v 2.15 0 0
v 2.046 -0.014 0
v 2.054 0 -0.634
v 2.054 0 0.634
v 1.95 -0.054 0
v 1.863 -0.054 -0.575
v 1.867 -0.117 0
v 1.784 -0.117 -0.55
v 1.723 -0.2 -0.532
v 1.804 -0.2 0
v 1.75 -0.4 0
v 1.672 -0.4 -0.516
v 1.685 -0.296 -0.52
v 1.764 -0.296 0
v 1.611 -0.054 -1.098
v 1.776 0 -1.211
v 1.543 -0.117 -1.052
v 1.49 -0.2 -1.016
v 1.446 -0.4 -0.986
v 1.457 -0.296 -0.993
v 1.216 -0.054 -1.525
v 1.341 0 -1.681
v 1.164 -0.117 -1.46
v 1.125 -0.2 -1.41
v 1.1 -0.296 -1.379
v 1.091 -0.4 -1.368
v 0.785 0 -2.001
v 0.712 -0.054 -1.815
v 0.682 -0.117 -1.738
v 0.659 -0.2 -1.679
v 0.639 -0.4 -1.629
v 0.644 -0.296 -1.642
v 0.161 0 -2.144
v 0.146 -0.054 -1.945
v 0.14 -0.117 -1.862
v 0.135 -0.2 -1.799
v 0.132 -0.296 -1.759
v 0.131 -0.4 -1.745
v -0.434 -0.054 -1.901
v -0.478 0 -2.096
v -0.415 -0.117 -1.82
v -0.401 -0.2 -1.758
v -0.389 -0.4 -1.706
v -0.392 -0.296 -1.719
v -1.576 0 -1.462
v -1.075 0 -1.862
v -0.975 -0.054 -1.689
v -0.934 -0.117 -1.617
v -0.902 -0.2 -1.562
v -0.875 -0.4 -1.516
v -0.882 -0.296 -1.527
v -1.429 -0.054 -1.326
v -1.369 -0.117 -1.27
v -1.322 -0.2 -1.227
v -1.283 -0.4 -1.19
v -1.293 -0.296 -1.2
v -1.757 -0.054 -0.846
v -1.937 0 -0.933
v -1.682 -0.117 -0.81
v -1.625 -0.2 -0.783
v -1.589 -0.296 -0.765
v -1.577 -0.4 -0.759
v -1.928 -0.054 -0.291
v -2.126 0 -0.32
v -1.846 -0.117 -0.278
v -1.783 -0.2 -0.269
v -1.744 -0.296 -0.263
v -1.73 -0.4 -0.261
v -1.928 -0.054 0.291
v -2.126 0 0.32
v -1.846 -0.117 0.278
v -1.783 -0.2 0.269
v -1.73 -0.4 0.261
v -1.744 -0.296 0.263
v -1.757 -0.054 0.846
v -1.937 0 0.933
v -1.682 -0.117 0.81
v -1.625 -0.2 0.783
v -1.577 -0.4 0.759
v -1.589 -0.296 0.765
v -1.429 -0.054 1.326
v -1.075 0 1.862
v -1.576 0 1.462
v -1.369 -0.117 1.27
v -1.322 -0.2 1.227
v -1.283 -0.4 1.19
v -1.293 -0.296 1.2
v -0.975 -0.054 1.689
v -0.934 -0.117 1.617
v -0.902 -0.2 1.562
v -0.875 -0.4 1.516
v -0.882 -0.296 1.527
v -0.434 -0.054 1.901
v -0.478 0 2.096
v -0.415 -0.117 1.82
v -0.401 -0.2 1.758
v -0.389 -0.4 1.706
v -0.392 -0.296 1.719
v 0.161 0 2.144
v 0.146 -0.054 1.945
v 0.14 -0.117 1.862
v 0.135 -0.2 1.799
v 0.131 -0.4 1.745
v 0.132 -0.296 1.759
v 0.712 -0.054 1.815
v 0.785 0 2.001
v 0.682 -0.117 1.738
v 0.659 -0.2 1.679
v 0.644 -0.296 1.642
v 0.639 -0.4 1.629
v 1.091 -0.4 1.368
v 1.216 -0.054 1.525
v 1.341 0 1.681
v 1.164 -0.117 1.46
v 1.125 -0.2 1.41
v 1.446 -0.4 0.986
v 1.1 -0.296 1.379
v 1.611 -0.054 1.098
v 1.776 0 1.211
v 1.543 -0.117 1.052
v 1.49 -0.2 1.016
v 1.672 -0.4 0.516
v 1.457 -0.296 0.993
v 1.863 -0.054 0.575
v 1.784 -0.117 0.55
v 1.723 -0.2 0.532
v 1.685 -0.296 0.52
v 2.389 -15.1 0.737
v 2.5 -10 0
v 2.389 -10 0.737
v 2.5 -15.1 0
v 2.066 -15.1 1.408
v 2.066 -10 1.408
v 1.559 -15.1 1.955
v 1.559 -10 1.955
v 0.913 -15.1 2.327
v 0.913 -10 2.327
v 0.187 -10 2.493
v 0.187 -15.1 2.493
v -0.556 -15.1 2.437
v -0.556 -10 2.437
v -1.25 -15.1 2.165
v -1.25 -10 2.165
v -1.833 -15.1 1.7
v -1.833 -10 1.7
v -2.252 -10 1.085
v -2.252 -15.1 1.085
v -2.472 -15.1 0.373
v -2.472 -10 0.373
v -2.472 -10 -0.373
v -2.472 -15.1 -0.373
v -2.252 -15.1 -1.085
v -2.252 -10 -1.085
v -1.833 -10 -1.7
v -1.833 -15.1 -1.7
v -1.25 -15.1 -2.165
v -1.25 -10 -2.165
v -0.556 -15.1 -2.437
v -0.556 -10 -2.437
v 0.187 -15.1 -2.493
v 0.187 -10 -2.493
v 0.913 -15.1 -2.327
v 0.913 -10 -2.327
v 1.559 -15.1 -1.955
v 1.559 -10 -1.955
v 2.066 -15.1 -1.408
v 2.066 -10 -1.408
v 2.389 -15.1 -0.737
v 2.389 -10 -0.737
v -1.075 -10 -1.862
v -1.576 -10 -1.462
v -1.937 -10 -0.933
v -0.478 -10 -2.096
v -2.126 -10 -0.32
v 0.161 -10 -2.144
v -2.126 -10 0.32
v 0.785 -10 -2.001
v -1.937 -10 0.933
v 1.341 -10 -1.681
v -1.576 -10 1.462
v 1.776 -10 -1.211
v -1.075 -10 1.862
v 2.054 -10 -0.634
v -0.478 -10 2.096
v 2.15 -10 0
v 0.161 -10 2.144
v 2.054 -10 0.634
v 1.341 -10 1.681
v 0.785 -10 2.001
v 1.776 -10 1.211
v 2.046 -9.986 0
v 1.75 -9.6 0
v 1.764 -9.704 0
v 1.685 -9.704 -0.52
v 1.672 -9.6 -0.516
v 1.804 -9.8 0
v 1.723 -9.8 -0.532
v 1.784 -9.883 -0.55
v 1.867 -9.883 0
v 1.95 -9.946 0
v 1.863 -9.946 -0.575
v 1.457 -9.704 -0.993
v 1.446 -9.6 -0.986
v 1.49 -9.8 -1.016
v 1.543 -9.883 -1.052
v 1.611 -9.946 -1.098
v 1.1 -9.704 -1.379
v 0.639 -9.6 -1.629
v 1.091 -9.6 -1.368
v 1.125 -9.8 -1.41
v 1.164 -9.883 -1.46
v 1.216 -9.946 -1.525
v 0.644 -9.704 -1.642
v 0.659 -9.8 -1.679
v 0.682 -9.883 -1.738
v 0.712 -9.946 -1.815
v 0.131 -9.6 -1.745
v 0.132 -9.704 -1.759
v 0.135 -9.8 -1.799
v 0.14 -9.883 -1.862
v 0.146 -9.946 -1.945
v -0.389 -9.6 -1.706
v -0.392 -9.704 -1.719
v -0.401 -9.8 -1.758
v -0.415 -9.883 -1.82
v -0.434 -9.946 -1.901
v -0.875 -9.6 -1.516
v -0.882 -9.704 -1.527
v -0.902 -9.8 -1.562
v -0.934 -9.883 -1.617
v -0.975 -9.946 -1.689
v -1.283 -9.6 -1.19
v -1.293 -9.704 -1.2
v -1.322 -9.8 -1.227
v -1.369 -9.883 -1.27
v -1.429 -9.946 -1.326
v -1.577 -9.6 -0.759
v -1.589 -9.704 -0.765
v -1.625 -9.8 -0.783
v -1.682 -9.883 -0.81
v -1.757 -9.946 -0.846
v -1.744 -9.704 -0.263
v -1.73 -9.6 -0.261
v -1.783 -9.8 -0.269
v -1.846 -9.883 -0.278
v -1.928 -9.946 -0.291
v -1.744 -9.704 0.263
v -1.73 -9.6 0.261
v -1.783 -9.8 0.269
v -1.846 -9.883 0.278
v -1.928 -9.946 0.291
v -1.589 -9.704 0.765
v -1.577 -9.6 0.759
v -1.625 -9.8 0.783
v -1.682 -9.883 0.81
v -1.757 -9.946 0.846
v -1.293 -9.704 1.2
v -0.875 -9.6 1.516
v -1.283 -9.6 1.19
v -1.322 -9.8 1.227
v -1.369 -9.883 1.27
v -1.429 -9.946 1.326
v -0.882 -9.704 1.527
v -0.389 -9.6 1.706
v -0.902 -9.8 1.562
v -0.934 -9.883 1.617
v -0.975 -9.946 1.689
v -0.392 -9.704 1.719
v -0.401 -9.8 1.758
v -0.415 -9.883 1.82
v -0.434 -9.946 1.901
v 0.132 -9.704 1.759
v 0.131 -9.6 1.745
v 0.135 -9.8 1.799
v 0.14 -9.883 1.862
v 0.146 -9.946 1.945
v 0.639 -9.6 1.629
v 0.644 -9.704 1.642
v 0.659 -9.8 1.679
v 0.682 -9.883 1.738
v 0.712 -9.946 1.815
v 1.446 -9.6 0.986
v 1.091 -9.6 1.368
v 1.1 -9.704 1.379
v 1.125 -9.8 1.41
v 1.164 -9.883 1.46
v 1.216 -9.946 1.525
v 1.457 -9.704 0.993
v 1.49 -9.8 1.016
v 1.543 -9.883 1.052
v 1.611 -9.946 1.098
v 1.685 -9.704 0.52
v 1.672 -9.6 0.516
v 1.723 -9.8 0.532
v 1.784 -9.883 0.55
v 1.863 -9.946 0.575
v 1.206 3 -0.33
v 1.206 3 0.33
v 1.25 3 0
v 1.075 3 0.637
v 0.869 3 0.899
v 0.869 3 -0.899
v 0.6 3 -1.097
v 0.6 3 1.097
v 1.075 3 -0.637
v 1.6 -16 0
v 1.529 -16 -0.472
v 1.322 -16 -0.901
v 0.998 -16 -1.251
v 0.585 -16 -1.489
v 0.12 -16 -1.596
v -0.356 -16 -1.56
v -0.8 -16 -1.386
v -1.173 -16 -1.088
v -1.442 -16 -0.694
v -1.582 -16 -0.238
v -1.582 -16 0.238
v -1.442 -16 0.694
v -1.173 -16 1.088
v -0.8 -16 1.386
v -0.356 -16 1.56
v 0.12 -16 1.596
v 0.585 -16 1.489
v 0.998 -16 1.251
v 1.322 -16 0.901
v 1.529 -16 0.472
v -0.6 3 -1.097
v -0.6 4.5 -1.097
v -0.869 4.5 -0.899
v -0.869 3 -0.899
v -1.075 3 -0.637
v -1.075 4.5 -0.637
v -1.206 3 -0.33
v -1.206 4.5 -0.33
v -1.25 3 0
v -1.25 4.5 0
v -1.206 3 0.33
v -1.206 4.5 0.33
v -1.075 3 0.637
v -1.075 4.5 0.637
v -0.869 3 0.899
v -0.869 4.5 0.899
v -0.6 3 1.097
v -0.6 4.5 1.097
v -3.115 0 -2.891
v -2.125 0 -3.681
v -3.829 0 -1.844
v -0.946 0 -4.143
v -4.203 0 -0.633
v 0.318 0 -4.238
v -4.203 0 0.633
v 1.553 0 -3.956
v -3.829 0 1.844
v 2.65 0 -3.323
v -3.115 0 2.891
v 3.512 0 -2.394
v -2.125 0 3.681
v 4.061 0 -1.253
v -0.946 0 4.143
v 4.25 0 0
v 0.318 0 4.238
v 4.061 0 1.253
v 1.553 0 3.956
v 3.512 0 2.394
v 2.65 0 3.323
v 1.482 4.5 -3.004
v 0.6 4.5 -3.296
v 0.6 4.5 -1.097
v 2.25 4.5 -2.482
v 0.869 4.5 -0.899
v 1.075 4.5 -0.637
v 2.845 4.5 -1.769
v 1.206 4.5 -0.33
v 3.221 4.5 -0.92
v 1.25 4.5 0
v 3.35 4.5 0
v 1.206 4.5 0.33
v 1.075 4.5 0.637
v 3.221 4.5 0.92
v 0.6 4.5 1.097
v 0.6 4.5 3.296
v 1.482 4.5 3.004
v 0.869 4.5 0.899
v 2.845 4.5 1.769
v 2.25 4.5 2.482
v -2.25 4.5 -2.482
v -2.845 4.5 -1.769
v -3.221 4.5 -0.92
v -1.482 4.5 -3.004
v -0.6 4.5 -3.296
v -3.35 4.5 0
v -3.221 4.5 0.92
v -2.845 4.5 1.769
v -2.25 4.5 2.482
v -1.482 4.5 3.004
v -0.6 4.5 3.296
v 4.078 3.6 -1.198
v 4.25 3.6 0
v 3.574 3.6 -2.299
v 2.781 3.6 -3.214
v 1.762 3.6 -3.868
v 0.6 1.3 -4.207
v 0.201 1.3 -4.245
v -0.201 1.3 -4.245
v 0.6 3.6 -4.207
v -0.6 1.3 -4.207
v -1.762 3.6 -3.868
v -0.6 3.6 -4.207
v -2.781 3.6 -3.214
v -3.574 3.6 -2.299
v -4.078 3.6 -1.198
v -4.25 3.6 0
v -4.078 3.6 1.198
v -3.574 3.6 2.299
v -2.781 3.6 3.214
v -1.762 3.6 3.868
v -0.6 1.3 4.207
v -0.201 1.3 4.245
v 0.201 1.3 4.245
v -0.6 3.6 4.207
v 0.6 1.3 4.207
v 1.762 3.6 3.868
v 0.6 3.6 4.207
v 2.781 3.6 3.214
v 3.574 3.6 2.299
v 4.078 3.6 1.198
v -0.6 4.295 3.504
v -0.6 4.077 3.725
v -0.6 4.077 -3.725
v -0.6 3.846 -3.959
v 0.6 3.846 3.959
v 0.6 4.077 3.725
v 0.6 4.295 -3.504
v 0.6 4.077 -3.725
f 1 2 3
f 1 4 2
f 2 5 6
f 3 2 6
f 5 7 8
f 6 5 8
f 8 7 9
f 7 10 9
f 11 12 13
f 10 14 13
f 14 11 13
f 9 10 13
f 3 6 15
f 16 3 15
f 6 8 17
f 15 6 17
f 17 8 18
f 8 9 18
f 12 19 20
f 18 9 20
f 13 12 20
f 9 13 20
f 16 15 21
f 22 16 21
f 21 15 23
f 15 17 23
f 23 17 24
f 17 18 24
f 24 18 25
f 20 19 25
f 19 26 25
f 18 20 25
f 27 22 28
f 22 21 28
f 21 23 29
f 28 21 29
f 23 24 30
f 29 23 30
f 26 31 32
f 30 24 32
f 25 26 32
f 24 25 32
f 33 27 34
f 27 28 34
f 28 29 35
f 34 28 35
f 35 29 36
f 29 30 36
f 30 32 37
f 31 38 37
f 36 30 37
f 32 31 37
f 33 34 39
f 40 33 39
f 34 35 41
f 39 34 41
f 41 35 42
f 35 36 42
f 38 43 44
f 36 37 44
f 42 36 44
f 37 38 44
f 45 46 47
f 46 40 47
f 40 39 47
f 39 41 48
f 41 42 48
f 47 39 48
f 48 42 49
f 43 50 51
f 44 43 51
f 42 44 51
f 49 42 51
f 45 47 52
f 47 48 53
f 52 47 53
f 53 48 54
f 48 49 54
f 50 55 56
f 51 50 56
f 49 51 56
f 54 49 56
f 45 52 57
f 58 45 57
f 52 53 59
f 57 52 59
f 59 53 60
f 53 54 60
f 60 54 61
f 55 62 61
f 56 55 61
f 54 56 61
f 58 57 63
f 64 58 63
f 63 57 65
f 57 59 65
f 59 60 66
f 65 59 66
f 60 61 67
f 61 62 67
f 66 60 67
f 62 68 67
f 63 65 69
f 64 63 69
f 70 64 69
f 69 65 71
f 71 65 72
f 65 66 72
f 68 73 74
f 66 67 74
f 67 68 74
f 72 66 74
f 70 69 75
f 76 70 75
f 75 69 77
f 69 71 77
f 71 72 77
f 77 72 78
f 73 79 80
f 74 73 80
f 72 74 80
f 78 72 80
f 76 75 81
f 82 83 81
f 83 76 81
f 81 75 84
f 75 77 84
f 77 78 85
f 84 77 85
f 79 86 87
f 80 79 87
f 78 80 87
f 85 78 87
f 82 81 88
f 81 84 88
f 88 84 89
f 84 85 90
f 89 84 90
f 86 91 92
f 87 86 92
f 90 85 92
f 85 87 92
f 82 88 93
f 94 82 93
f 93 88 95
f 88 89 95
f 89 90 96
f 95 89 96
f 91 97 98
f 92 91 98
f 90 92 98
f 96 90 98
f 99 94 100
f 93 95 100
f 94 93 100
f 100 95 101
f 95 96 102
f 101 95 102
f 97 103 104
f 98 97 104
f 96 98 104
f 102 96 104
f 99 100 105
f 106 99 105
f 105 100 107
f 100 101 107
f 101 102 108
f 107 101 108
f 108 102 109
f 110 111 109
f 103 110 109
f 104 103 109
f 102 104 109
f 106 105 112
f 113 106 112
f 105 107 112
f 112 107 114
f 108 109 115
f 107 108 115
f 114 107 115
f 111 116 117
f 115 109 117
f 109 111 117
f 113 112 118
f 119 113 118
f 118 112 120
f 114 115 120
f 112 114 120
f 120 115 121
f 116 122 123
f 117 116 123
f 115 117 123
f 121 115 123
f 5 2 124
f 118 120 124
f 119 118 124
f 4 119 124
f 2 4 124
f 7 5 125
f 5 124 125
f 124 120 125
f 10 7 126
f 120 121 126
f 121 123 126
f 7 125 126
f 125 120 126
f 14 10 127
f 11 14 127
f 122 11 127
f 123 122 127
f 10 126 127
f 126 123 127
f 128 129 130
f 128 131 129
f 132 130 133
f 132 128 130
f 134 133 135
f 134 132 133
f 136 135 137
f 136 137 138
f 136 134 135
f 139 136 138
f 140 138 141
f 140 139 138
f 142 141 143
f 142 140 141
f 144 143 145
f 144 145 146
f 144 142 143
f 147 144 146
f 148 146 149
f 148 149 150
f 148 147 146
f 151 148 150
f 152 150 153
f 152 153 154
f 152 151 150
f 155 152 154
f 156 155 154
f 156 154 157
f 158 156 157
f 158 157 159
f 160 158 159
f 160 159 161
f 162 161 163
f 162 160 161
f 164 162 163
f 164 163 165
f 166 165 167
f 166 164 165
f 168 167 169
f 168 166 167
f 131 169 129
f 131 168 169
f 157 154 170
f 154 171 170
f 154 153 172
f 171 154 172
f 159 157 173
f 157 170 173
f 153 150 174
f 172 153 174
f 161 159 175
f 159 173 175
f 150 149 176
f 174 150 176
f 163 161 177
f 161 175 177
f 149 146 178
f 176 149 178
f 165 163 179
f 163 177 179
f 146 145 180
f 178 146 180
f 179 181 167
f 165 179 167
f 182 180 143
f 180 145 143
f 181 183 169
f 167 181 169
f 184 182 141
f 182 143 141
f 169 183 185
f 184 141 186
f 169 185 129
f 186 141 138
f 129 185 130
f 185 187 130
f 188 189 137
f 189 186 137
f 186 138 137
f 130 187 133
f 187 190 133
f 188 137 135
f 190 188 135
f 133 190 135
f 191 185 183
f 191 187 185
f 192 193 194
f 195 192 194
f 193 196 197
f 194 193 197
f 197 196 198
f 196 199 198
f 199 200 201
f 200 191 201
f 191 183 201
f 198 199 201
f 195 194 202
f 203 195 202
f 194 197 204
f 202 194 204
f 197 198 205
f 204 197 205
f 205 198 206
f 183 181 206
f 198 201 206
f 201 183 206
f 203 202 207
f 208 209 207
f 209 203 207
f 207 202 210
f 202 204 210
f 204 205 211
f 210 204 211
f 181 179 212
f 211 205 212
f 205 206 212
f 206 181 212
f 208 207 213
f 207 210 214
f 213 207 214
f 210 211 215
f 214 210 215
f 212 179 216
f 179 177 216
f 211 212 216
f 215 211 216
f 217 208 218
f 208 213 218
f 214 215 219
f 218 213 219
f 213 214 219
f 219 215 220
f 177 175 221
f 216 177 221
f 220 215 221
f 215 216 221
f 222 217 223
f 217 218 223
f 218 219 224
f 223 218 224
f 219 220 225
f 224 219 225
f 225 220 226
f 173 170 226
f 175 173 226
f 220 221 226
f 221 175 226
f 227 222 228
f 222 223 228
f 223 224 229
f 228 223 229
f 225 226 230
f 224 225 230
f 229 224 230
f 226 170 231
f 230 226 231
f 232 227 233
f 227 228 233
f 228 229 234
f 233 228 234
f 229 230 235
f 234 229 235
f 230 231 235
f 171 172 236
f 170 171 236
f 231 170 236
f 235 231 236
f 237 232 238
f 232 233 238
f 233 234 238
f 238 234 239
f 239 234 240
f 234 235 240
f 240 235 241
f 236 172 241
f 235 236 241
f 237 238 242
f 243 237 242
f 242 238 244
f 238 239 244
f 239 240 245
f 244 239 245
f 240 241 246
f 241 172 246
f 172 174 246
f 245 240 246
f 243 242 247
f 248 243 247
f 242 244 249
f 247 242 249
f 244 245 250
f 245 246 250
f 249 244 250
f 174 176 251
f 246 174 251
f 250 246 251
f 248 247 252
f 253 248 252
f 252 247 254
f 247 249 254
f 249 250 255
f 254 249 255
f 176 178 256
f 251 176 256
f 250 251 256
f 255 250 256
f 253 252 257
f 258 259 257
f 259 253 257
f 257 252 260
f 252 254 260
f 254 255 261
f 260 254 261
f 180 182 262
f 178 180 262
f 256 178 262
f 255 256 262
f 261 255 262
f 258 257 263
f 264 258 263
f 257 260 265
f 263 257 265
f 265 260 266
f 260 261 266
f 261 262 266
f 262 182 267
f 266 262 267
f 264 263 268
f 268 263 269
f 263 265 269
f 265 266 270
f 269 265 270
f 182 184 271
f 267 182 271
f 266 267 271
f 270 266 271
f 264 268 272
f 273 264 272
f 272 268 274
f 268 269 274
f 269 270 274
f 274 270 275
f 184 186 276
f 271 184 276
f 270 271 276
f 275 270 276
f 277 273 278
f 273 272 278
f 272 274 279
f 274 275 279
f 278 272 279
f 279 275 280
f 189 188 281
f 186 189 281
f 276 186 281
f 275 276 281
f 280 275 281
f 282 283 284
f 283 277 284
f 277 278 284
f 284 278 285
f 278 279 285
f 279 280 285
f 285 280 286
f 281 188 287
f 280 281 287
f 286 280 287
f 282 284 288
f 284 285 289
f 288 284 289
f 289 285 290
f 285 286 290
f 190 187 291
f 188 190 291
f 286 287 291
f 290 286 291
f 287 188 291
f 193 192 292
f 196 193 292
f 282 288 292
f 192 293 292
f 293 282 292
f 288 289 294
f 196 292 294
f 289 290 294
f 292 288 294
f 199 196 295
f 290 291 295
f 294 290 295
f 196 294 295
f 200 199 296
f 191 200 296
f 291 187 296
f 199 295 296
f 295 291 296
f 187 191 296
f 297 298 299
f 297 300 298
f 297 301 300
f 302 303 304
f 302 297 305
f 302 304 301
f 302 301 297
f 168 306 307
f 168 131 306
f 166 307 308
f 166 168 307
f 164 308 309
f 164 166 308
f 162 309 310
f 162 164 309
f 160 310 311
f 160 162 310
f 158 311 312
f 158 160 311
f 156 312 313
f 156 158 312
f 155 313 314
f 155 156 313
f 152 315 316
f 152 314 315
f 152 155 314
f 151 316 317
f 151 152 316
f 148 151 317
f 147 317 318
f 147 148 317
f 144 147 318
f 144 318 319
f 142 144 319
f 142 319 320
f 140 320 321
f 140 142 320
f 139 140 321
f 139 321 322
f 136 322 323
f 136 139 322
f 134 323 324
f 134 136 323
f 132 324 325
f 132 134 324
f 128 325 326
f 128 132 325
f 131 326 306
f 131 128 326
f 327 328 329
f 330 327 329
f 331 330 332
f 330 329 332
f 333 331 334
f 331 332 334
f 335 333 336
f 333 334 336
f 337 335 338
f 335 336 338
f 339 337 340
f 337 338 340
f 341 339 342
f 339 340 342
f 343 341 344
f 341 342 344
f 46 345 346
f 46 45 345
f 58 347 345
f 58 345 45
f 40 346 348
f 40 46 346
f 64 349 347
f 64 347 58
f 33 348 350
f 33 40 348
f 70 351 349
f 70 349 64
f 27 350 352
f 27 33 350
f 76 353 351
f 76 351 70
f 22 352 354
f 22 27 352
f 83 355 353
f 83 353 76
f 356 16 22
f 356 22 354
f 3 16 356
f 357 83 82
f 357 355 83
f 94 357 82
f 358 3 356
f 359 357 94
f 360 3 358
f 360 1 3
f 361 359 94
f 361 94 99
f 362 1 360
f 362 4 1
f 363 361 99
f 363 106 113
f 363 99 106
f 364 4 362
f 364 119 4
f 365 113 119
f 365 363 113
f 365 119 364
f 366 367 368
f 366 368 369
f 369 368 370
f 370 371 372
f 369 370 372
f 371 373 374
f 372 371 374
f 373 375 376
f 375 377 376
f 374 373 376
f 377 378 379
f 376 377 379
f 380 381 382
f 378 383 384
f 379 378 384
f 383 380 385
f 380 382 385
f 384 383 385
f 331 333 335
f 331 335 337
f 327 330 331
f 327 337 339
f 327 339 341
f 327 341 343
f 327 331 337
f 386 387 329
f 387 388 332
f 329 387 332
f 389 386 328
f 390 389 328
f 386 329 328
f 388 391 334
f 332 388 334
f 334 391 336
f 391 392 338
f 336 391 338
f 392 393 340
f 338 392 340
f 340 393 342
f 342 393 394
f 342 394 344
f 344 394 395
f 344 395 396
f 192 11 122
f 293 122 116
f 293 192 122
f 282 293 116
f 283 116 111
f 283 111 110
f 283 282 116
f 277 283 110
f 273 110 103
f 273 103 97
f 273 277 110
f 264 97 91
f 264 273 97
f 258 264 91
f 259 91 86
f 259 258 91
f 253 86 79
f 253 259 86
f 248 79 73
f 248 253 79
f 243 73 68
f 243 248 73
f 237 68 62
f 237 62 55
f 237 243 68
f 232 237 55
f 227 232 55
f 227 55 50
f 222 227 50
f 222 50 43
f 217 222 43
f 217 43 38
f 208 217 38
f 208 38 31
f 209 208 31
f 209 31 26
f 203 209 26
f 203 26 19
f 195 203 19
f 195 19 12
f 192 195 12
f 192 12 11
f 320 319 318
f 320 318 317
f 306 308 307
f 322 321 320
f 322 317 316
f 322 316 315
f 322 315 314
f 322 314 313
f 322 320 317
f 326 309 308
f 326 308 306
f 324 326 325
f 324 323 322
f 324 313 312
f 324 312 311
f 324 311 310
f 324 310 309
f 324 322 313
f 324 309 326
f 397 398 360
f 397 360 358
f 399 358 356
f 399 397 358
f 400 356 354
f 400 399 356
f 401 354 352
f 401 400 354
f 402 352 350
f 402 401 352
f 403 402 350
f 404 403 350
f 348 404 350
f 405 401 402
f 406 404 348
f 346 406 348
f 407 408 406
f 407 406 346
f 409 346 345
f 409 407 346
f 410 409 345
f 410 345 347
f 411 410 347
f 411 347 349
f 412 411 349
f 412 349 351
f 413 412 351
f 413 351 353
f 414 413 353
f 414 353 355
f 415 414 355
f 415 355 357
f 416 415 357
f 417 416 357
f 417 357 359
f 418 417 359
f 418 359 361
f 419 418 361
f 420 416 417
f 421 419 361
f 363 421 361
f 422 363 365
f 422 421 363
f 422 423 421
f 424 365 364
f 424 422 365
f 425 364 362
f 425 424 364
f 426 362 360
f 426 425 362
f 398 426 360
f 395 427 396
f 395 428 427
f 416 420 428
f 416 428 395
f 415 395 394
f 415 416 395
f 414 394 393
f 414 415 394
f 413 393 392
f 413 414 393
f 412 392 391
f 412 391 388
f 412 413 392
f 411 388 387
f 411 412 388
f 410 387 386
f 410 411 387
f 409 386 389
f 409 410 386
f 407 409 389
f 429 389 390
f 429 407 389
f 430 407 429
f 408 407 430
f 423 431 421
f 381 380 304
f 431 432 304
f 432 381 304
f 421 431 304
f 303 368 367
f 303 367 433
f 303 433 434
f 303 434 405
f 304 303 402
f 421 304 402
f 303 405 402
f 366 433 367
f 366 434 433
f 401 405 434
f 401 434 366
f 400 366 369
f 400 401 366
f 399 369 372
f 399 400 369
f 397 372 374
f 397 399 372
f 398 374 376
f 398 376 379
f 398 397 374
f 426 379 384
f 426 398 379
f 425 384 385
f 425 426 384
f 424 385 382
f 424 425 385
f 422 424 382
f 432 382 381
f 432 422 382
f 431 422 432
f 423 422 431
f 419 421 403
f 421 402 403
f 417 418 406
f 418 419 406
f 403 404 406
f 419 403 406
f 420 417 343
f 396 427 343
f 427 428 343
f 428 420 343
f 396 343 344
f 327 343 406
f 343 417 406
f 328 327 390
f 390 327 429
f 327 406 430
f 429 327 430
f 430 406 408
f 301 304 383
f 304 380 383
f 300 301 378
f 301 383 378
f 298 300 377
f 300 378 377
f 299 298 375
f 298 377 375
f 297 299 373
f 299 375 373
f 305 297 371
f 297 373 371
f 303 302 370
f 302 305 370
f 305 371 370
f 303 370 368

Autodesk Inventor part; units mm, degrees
ref_plane "YZ Plane" through (0, 0, 0) normal (1, 0, 0) x (0, 1, 0)
ref_plane "XZ Plane" through (0, 0, 0) normal (0, 1, 0) x (-1, 0, 0)
ref_plane "XY Plane" through (0, 0, 0) normal (0, 0, 1) x (1, 0, 0)
sketch "Sketch1" plane through (0, 0, 0) normal (0, 0, 1) x (1, 0, 0)
  line L0 (4.25, 0) -> (4.25, 4.5)
  line L1 (4.25, 4.5) -> (0, 4.5)
  line L2 (4.25, 0) -> (1.75, 0)
  line L3 (1.75, 0) -> (1.75, -10)
  line L4 (1.75, -10) -> (2.5, -10)
  line L5 (2.5, -10) -> (2.5, -16)
  line L6 (2.5, -16) -> (0, -16)
  line L7 (0, 4.5) -> (0, -16)
  point P0 (0, 0)
  dimension "d0" = 8.5
  dimension "d2" = 3.5
  dimension "d3" = 5
  dimension "d4" = 4.5
  dimension "d5" = 6
  dimension "d6" = 16
revolve "Вращение1" add sketch "Sketch1" angle 360 about axis through (0, 4.5, 0) along (0, -1, 0)
sketch "Sketch2" plane through (0, 4.5, 0) normal (0, 1, 0) x (1, 0, 0)
  circle A0 centre (0, 0) radius 4.25 construction
  circle A1 centre (0, 0) radius 1.25
  dimension "d31" = 2.5
extrude "Выдавливание1" cut sketch "Sketch2" against normal blind 1.5
chamfer "Фаска1" distance 0.9 angle 45 1 edges at (-4.25, 4.5, 0)
sketch "Sketch3" plane through (0, 0, 0) normal (0, 0, 1) x (1, 0, 0)
  line L0 (0, 0) -> (0, 4.5)
  line L1 (-2.3552, 0) -> (2.3552, 0) construction
  line L2 (-4.25, 4.5) -> (4.25, 4.5) construction
  line L3 (-0.6, 4.5) -> (0.6, 4.5)
  line L4 (0.6, 4.5) -> (0.6, 1.3)
  line L5 (0.6, 1.3) -> (-0.6, 1.3)
  line L6 (-0.6, 1.3) -> (-0.6, 4.5)
  dimension "d8" = 1.3
  dimension "d9" = 1.2
extrude "Выдавливание2" cut sketch "Sketch3" along normal through all both and the other way through all
fillet "Сопряжение1" radius 0.4 2 edges at (-1.75, 0, 0) (-1.75, -10, 0)
thread "Резьба1" size "M5x0.8" class "6g" standard "ISO Metric profile" length 6
chamfer "Фаска2" distance 0.9 angle 45 1 edges at (-2.5, -16, 0)
equation "\"d31\" = d3_"
equation "\"d32\" = h3"
equation "\"d21\" = C1"
equation "\"d8\" = h2"
equation "\"d9\" = n"
equation "\"d12\" = R"
equation "\"d13\" = b"
equation "\"d15\" = C1"
equation "\"d0\" = D"
equation "\"d2\" = d1"
equation "\"d3\" = d_"
equation "\"d4\" = k1"
equation "\"d5\" = b"
equation "\"d6\" = l_"
equation "\"D\" = 8.5"
equation "\"d_\" = 5"
equation "\"l_\" = 16"
equation "\"b\" = 6"
equation "\"d1\" = 3.5"
equation "\"R\" = 0.4"
equation "\"C1\" = 0.9"
equation "\"h2\" = 1.3"
equation "\"n\" = 1.2"
equation "\"h3\" = 1.5"
equation "\"k1\" = 4.5"
equation "\"d3_\" = 2.5"
properties part number "Винт 3 M5-6gx16 ГОСТ 10336-80" material "Сталь, мягкая"
